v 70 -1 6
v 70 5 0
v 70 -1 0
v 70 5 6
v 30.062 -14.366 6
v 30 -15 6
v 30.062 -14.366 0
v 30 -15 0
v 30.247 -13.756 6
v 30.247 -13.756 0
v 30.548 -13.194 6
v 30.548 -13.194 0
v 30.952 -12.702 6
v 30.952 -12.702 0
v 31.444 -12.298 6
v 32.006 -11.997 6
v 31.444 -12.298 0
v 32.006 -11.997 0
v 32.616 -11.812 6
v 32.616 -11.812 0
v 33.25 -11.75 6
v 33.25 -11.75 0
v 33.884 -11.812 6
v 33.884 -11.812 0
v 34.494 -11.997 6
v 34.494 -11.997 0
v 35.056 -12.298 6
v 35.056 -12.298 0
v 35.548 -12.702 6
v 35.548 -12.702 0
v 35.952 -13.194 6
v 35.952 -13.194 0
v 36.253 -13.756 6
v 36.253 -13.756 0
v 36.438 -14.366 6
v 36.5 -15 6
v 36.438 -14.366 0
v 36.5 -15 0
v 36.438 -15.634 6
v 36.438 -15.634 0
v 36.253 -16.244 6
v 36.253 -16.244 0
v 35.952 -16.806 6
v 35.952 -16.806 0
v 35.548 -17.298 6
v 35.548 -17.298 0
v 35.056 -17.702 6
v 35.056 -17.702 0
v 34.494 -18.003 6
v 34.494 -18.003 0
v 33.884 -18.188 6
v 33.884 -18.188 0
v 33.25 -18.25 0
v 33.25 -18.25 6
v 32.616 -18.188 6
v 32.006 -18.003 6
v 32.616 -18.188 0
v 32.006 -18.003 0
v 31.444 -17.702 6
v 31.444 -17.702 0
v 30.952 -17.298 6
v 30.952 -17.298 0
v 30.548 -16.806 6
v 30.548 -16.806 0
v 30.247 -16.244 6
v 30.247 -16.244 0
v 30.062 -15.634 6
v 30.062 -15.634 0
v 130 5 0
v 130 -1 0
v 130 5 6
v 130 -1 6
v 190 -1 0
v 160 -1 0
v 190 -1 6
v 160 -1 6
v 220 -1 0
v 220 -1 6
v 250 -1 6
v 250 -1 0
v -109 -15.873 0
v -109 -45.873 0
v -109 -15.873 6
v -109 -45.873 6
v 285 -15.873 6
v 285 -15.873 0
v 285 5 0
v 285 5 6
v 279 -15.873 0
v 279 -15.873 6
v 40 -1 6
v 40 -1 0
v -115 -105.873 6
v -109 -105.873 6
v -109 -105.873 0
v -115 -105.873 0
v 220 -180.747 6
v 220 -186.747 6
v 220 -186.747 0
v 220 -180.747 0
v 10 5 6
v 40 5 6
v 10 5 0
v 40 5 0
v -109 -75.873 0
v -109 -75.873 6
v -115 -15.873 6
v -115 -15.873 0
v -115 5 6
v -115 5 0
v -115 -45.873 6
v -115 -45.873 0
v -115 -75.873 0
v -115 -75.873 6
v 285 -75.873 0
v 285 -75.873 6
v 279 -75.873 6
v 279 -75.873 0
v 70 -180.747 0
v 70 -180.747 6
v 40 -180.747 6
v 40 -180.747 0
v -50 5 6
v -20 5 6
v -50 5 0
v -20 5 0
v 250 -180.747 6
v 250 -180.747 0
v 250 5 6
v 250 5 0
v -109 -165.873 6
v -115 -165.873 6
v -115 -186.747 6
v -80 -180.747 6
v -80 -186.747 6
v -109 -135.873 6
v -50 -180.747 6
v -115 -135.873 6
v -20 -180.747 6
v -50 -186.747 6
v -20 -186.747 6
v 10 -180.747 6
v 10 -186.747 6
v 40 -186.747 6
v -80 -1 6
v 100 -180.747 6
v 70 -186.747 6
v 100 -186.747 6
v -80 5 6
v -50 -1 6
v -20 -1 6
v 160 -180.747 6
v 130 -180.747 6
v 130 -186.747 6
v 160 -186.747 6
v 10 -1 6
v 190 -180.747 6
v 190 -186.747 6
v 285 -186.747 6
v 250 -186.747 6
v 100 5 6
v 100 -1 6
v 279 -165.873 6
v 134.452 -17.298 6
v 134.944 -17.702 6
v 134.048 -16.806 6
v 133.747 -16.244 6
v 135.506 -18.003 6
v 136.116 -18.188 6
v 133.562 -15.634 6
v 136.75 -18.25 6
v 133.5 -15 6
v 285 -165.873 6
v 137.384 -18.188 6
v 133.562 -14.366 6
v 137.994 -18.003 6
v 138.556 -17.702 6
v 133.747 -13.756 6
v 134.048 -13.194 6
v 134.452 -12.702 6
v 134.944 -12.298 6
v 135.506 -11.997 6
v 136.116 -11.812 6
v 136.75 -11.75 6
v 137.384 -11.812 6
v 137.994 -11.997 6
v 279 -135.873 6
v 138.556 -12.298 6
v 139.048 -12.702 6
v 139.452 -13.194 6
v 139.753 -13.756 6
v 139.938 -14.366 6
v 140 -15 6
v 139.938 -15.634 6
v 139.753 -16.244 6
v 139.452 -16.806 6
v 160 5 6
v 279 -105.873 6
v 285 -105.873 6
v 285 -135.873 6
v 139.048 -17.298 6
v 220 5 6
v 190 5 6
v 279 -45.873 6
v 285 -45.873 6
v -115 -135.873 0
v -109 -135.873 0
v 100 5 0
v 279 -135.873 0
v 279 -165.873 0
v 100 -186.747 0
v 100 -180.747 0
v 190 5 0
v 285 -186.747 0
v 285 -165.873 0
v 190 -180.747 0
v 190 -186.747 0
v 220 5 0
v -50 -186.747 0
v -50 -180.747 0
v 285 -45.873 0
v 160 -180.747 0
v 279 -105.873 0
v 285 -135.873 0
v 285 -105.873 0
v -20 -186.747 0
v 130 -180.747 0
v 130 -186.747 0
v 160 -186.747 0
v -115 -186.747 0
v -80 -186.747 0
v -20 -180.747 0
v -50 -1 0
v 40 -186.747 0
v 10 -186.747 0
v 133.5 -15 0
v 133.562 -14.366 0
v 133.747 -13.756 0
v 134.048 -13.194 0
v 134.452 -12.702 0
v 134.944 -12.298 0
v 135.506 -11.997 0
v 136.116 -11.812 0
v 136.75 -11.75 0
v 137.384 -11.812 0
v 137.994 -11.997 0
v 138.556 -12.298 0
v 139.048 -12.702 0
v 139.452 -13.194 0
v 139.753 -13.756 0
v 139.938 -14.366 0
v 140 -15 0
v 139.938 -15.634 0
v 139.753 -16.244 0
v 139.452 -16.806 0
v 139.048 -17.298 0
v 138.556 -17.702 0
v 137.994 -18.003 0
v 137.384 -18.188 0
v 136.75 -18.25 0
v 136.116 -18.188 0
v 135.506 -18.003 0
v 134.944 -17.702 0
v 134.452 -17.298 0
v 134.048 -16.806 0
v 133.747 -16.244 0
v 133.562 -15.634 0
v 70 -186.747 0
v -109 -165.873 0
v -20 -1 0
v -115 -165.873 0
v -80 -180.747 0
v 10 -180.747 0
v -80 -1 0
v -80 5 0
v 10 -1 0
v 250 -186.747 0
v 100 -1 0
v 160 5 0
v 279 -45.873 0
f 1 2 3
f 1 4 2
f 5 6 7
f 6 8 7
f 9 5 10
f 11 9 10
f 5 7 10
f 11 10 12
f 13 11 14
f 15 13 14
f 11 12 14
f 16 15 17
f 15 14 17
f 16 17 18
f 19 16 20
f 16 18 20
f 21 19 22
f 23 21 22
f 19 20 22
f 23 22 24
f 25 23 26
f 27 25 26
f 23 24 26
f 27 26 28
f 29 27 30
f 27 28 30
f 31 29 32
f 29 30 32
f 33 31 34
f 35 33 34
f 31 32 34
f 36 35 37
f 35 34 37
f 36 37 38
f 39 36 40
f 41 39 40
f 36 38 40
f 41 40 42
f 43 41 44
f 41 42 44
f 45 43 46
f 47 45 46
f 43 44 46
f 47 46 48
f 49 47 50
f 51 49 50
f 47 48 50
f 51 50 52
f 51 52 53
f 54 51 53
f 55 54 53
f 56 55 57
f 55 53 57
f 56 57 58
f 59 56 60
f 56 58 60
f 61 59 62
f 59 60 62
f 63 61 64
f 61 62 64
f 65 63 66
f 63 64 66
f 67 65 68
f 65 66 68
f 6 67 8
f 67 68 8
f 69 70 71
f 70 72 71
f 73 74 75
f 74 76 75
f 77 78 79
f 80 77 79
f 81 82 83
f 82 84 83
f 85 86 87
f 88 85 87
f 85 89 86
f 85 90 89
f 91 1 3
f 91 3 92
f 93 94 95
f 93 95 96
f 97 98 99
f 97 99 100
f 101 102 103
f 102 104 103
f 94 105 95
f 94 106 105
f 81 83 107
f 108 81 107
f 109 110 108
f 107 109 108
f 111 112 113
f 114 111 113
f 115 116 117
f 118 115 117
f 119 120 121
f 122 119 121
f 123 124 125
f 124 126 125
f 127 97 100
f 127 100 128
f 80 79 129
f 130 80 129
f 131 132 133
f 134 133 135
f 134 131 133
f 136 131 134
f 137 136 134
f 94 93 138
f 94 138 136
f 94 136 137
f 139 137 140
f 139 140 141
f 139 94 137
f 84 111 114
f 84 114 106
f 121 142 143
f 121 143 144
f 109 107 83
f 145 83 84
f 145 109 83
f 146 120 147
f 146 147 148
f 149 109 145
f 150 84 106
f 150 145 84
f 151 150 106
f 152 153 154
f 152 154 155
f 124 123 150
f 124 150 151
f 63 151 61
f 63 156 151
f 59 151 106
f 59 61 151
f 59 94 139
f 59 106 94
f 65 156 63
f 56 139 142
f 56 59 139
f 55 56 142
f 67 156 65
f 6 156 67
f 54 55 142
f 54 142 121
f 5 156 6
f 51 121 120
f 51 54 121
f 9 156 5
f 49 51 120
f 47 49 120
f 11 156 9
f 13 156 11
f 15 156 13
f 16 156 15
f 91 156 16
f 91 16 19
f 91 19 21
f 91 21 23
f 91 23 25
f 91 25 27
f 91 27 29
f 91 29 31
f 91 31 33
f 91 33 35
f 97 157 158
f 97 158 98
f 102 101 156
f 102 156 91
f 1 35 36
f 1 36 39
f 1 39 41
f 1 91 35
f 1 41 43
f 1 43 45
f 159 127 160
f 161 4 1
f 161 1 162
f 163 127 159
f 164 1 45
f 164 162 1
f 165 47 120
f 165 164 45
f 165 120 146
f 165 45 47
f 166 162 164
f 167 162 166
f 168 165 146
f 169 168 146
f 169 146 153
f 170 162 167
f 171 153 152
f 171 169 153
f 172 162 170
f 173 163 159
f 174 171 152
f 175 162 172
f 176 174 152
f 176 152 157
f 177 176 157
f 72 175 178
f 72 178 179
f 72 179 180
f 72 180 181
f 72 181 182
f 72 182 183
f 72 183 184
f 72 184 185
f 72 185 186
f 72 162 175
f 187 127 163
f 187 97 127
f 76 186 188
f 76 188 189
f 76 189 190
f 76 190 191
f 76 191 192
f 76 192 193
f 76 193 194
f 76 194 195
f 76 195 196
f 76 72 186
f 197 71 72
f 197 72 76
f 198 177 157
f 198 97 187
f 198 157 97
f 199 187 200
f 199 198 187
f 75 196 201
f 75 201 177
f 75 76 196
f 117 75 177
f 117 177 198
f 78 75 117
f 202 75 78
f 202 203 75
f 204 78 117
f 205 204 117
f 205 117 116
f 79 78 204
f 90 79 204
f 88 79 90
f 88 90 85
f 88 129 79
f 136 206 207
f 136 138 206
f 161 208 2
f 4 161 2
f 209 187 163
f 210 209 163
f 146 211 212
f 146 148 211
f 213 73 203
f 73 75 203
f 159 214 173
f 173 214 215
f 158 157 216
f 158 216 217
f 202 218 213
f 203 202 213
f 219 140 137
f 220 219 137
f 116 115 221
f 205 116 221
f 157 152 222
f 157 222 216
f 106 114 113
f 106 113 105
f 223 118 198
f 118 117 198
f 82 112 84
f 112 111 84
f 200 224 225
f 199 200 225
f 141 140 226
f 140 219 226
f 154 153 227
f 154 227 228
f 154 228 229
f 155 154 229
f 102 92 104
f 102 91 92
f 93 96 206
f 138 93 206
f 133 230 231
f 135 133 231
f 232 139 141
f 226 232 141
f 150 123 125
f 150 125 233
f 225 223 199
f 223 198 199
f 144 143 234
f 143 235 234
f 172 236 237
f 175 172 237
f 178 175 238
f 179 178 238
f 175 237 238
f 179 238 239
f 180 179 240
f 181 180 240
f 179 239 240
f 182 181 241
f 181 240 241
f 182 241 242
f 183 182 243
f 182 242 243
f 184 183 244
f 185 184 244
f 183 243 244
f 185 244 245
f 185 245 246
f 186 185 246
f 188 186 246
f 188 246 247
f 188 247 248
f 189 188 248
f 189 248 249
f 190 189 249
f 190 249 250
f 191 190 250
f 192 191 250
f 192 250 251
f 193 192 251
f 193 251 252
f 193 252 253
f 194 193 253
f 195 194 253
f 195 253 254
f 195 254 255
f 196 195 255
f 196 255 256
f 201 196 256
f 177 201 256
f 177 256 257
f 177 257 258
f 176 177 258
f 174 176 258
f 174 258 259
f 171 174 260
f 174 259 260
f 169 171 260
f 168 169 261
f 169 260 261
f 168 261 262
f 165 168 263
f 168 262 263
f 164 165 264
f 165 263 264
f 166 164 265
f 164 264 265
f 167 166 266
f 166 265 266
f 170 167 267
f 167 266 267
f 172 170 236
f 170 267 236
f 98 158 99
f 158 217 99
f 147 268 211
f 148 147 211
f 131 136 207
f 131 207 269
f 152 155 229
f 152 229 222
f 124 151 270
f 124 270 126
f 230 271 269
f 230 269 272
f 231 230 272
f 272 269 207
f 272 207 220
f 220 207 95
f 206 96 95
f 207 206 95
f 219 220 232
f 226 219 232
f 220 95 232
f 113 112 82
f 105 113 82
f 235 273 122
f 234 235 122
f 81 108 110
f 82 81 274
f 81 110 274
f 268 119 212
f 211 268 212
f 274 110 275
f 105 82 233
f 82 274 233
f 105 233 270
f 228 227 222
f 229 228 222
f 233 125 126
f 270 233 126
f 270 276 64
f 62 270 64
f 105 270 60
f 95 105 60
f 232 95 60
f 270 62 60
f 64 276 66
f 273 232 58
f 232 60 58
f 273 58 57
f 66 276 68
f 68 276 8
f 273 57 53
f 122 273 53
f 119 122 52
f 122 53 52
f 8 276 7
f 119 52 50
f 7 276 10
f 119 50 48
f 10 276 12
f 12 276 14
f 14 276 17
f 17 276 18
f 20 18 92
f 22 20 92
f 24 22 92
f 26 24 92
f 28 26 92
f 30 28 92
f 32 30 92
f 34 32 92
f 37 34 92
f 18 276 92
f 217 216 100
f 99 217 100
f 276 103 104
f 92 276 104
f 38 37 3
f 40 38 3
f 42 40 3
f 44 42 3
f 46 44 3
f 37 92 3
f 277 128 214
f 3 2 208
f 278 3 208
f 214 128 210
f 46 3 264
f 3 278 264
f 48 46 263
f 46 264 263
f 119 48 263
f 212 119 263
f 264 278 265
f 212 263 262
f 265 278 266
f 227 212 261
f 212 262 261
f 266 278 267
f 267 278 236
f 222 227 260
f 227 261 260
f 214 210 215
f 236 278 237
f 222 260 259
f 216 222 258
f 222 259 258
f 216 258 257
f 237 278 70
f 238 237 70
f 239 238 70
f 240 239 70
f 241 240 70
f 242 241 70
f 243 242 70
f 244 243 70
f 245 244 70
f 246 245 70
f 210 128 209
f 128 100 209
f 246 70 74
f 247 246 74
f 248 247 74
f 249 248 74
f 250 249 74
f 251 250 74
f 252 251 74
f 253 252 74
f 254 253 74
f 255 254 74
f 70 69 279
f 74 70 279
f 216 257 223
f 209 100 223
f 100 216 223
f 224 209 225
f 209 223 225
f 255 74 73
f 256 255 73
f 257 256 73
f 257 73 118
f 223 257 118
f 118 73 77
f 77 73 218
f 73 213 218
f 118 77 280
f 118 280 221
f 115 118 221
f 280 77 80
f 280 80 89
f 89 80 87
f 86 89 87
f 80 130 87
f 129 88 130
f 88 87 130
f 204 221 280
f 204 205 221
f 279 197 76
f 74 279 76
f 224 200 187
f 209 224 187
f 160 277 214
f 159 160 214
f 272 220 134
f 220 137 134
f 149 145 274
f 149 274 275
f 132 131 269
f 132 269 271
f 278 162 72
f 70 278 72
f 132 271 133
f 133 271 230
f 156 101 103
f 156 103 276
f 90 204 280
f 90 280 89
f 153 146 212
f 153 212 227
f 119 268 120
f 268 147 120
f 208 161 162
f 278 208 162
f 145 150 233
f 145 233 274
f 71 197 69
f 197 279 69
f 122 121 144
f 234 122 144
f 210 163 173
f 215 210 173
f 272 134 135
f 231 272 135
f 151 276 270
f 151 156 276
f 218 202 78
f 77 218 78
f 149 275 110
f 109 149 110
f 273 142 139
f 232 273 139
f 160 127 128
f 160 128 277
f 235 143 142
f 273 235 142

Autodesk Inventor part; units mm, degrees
ref_plane "YZ Plane" through (0, 0, 0) normal (1, 0, 0) x (0, 1, 0)
ref_plane "XZ Plane" through (0, 0, 0) normal (0, 1, 0) x (-1, 0, 0)
ref_plane "Work Plane1" through (0, 0, 0) normal (0, 0, 1) x (1, 0, 0)
sketch "Sketch1" plane through (0, 0, 0) normal (0, 0, 1) x (1, 0, 0)
  line L0 (0, -5) -> (43, -5) projected
  line L1 (0, -25) -> (0, -5) projected
  line L2 (0, -25) -> (3, -25) projected
  line L3 (3, -25) -> (43, -25) projected
  line L4 (43, -5) -> (43, -25) projected
  line L5 (127, -5) -> (170, -5) projected
  line L6 (127, -5) -> (127, -25) projected
  line L7 (167, -25) -> (127, -25) projected
  line L8 (170, -25) -> (167, -25) projected
  line L9 (170, -25) -> (170, -5) projected
  ellipse E0 centre (272.0385, -161.4535) end of major axis (262.0385, -161.4535) minor radius 9.7437 projected
  line L10 (264.0385, -174.9547) -> (285, -186.7467) projected
  line L11 (285, -186.7467) -> (285, -136.1602) projected
  line L12 (285, -136.1602) -> (264.0385, -147.9522) projected
  ellipse E1 centre (272.0385, -161.4535) end of major axis (256.0385, -161.4535) minor radius 15.5899 (264.0385, -147.9522) -> (264.0385, -174.9547) ccw projected
  ellipse E2 centre (-102.0385, -161.4535) end of major axis (-92.0385, -161.4535) minor radius 9.7437 projected
  line L13 (-94.0385, -174.9547) -> (-115, -186.7467) projected
  ellipse E3 centre (-102.0385, -161.4535) end of major axis (-86.0385, -161.4535) minor radius 15.5899 (-94.0385, -174.9547) -> (-94.0385, -147.9522) ccw projected
  line L14 (-115, -136.1602) -> (-94.0385, -147.9522) projected
  line L15 (-115, -186.7467) -> (-115, -136.1602) projected
  line L16 (-115, -136.1602) -> (-115, -5) construction
  line L17 (-115, -5) -> (285, -5) construction
  line L18 (285, -5) -> (285, -186.7467) construction
  line L19 (285, -186.7467) -> (-115, -186.7467) construction
  line L20 (-115, -186.7467) -> (-115, -136.1602) construction
  line L21 (285, -5) -> (-115, -5)
  line L22 (-115, -5) -> (-115, -186.7467)
  line L23 (-115, -186.7467) -> (285, -186.7467)
  line L24 (285, -186.7467) -> (285, -5)
  circle A0 centre (147, -15) radius 3.25
  circle A1 centre (23, -15) radius 3.25
  circle A2 centre (23, -15) radius 2.4585 projected
  circle A3 centre (147, -15) radius 2.4585 projected
  line L25 (-115, -5) -> (285, -5)
  line L26 (285, -5) -> (285, 5)
  line L27 (285, 5) -> (-115, 5)
  line L28 (-115, 5) -> (-115, -5)
  point P0 (0, 0)
  point P1 (170, -15)
  point P2 (147, -25)
  point P3 (23, -25)
  point P4 (43, -15)
  dimension "d0" = 6.5
  dimension "d2" = 10
extrude "Plate1" add sketch "Sketch1" along normal blind 6 contours L21 L28 L27 L26 L5 L0 | L0 L4 L3 L2 L1 | L1 L2 L3 L4 L21 L6 L7 L8 L9 L24 L12 E1 L10 L23 L13 E3 L14 L22 | L5 L9 L8 L7 L6 | L14 E3 L13 L15 | L10 E1 L12 L11 | E0 | E2 | A0 | A1 | A2 | A3
sketch "Sketch2" plane through (0, 0, 6) normal (0, 0, 1) x (1, 0, 0)
  line L0 (-115, -186.7467) -> (-115, 5) projected
  line L1 (285, -186.7467) -> (-115, -186.7467) projected
  line L2 (285, 5) -> (285, -186.7467) projected
  line L3 (-115, 5) -> (285, 5) projected
  line L4 (285, -186.7467) -> (285, 5) projected
  line L5 (285, -75.8734) -> (279, -75.8734)
  line L6 (279, -75.8734) -> (279, -105.8734)
  line L7 (279, -105.8734) -> (285, -105.8734)
  line L8 (285, -105.8734) -> (285, -75.8734)
  line L9 (285, -45.8734) -> (279, -45.8734)
  line L10 (279, -45.8734) -> (279, -15.8734)
  line L11 (279, -15.8734) -> (285, -15.8734)
  line L12 (285, -15.8734) -> (285, -45.8734)
  line L13 (285, -135.8734) -> (279, -135.8734)
  line L14 (279, -135.8734) -> (279, -165.8734)
  line L15 (279, -165.8734) -> (285, -165.8734)
  line L16 (285, -165.8734) -> (285, -135.8734)
  line L17 (285, 5) -> (-115, 5) construction
  line L18 (85, 5) -> (85, -186.7467) construction
  line L19 (-115, -75.8734) -> (-109, -75.8734)
  line L20 (-109, -75.8734) -> (-109, -105.8734)
  line L21 (-109, -105.8734) -> (-115, -105.8734)
  line L22 (-115, -105.8734) -> (-115, -75.8734)
  line L23 (-115, -45.8734) -> (-109, -45.8734)
  line L24 (-109, -45.8734) -> (-109, -15.8734)
  line L25 (-109, -15.8734) -> (-115, -15.8734)
  line L26 (-115, -15.8734) -> (-115, -45.8734)
  line L27 (-115, -135.8734) -> (-109, -135.8734)
  line L28 (-109, -135.8734) -> (-109, -165.8734)
  line L29 (-109, -165.8734) -> (-115, -165.8734)
  line L30 (-115, -165.8734) -> (-115, -135.8734)
  line L31 (-115, -186.7467) -> (285, -186.7467) projected
  line L32 (250, -186.7467) -> (220, -186.7467)
  line L33 (220, -186.7467) -> (220, -180.7467)
  line L34 (220, -180.7467) -> (250, -180.7467)
  line L35 (250, -180.7467) -> (250, -186.7467)
  line L36 (190, -186.7467) -> (160, -186.7467)
  line L37 (160, -186.7467) -> (160, -180.7467)
  line L38 (160, -180.7467) -> (190, -180.7467)
  line L39 (190, -180.7467) -> (190, -186.7467)
  line L40 (130, -186.7467) -> (100, -186.7467)
  line L41 (100, -186.7467) -> (100, -180.7467)
  line L42 (100, -180.7467) -> (130, -180.7467)
  line L43 (130, -180.7467) -> (130, -186.7467)
  line L44 (285, -90.8734) -> (-115, -90.8734) construction
  line L45 (250, 5) -> (220, 5)
  line L46 (220, 5) -> (220, -1)
  line L47 (220, -1) -> (250, -1)
  line L48 (250, -1) -> (250, 5)
  line L49 (190, 5) -> (160, 5)
  line L50 (160, 5) -> (160, -1)
  line L51 (160, -1) -> (190, -1)
  line L52 (190, -1) -> (190, 5)
  line L53 (130, 5) -> (100, 5)
  line L54 (100, 5) -> (100, -1)
  line L55 (100, -1) -> (130, -1)
  line L56 (130, -1) -> (130, 5)
  circle A0 centre (23, -15) radius 3.25
  line L57 (-80, -186.7467) -> (-50, -186.7467)
  line L58 (-50, -186.7467) -> (-50, -180.7467)
  line L59 (-50, -180.7467) -> (-80, -180.7467)
  line L60 (-80, -180.7467) -> (-80, -186.7467)
  line L61 (-20, -186.7467) -> (10, -186.7467)
  line L62 (10, -186.7467) -> (10, -180.7467)
  line L63 (10, -180.7467) -> (-20, -180.7467)
  line L64 (-20, -180.7467) -> (-20, -186.7467)
  line L65 (40, -186.7467) -> (70, -186.7467)
  line L66 (70, -186.7467) -> (70, -180.7467)
  line L67 (70, -180.7467) -> (40, -180.7467)
  line L68 (40, -180.7467) -> (40, -186.7467)
  line L69 (70, 5) -> (70, -1)
  line L70 (40, 5) -> (70, 5)
  line L71 (40, -1) -> (40, 5)
  line L72 (10, 5) -> (10, -1)
  line L73 (-20, 5) -> (10, 5)
  line L74 (10, -1) -> (-20, -1)
  line L75 (-20, -1) -> (-20, 5)
  line L76 (70, -1) -> (40, -1)
  line L77 (-50, 5) -> (-50, -1)
  line L78 (-80, 5) -> (-50, 5)
  line L79 (-80, -1) -> (-80, 5)
  line L80 (-50, -1) -> (-80, -1)
  point P0 (0, 0)
  point P1 (115, -180.7467)
  point P2 (115, -1)
  point P3 (55, -180.7467)
  point P4 (55, -1)
  dimension "d3" = 6
  dimension "d4" = 30
  dimension "d5" = 30
  dimension "d6" = 30
  dimension "d7" = 30
  dimension "d8" = 30
  dimension "d10" = 15
extrude "Cut1" cut sketch "Sketch2" against normal blind 6 contours L0 L27 L28 L29 | L60 L59 L58 L1 | L0 L19 L20 L21 | L64 L63 L62 L1 | L0 L25 L24 L23 | L68 L67 L66 L1 | L41 L42 L43 L1 | L3 L77 L80 L79 | L37 L38 L39 L1 | L3 L72 L74 L75 | L33 L34 L35 L1 | L3 L69 L76 L71 | L3 L56 L55 L54 | L15 L14 L13 L2 | L3 L52 L51 L50 | L7 L6 L5 L2 | L3 L48 L47 L46 | L9 L10 L11 L2
sketch "Sketch3" plane through (0, 0, 0) normal (0, 0, -1) x (-1, 0, 0)
  circle A0 centre (-147, -15) radius 3.25 projected
  circle A1 centre (-23, -15) radius 3.25 projected
  circle A2 centre (-136.75, -15) radius 3.25
  circle A3 centre (-33.25, -15) radius 3.25
  line L0 (115, -5) -> (-285, -5) construction
  line L1 (-136.75, -15) -> (-33.25, -15) construction
  point P0 (0, 0)
  point P1 (-23, -15)
  point P2 (-85, -15)
  point P3 (-85, -5)
  dimension "d13" = 103.5
extrude "Cut2" cut sketch "Sketch3" against normal blind 6 contours A2 | A3
equation "\"d5\" = d4"
equation "\"d6\" = d5"
equation "\"d7\" = d4"
equation "\"d8\" = d7"
equation "\"d11\" = Thickness"
equation "\"d14\" = Thickness"
equation "\"d1\" = Thickness"
equation "\"BendRadius\" = Thickness"
equation "\"BendReliefWidth\" = Thickness"
equation "\"BendReliefDepth\" = 0.5 * Thickness"
equation "\"CornerReliefSize\" = 4 * Thickness"
equation "\"MinimumRemnant\" = 2 * Thickness"
equation "\"TransitionRadius\" = BendRadius"
equation "\"JacobiRadiusSize\" = BendRadius"
equation "\"GapSize\" = Thickness"
equation "\"Thickness\" = 6"
properties part number "elektronica behuizing" material "Wood (Birch)"
